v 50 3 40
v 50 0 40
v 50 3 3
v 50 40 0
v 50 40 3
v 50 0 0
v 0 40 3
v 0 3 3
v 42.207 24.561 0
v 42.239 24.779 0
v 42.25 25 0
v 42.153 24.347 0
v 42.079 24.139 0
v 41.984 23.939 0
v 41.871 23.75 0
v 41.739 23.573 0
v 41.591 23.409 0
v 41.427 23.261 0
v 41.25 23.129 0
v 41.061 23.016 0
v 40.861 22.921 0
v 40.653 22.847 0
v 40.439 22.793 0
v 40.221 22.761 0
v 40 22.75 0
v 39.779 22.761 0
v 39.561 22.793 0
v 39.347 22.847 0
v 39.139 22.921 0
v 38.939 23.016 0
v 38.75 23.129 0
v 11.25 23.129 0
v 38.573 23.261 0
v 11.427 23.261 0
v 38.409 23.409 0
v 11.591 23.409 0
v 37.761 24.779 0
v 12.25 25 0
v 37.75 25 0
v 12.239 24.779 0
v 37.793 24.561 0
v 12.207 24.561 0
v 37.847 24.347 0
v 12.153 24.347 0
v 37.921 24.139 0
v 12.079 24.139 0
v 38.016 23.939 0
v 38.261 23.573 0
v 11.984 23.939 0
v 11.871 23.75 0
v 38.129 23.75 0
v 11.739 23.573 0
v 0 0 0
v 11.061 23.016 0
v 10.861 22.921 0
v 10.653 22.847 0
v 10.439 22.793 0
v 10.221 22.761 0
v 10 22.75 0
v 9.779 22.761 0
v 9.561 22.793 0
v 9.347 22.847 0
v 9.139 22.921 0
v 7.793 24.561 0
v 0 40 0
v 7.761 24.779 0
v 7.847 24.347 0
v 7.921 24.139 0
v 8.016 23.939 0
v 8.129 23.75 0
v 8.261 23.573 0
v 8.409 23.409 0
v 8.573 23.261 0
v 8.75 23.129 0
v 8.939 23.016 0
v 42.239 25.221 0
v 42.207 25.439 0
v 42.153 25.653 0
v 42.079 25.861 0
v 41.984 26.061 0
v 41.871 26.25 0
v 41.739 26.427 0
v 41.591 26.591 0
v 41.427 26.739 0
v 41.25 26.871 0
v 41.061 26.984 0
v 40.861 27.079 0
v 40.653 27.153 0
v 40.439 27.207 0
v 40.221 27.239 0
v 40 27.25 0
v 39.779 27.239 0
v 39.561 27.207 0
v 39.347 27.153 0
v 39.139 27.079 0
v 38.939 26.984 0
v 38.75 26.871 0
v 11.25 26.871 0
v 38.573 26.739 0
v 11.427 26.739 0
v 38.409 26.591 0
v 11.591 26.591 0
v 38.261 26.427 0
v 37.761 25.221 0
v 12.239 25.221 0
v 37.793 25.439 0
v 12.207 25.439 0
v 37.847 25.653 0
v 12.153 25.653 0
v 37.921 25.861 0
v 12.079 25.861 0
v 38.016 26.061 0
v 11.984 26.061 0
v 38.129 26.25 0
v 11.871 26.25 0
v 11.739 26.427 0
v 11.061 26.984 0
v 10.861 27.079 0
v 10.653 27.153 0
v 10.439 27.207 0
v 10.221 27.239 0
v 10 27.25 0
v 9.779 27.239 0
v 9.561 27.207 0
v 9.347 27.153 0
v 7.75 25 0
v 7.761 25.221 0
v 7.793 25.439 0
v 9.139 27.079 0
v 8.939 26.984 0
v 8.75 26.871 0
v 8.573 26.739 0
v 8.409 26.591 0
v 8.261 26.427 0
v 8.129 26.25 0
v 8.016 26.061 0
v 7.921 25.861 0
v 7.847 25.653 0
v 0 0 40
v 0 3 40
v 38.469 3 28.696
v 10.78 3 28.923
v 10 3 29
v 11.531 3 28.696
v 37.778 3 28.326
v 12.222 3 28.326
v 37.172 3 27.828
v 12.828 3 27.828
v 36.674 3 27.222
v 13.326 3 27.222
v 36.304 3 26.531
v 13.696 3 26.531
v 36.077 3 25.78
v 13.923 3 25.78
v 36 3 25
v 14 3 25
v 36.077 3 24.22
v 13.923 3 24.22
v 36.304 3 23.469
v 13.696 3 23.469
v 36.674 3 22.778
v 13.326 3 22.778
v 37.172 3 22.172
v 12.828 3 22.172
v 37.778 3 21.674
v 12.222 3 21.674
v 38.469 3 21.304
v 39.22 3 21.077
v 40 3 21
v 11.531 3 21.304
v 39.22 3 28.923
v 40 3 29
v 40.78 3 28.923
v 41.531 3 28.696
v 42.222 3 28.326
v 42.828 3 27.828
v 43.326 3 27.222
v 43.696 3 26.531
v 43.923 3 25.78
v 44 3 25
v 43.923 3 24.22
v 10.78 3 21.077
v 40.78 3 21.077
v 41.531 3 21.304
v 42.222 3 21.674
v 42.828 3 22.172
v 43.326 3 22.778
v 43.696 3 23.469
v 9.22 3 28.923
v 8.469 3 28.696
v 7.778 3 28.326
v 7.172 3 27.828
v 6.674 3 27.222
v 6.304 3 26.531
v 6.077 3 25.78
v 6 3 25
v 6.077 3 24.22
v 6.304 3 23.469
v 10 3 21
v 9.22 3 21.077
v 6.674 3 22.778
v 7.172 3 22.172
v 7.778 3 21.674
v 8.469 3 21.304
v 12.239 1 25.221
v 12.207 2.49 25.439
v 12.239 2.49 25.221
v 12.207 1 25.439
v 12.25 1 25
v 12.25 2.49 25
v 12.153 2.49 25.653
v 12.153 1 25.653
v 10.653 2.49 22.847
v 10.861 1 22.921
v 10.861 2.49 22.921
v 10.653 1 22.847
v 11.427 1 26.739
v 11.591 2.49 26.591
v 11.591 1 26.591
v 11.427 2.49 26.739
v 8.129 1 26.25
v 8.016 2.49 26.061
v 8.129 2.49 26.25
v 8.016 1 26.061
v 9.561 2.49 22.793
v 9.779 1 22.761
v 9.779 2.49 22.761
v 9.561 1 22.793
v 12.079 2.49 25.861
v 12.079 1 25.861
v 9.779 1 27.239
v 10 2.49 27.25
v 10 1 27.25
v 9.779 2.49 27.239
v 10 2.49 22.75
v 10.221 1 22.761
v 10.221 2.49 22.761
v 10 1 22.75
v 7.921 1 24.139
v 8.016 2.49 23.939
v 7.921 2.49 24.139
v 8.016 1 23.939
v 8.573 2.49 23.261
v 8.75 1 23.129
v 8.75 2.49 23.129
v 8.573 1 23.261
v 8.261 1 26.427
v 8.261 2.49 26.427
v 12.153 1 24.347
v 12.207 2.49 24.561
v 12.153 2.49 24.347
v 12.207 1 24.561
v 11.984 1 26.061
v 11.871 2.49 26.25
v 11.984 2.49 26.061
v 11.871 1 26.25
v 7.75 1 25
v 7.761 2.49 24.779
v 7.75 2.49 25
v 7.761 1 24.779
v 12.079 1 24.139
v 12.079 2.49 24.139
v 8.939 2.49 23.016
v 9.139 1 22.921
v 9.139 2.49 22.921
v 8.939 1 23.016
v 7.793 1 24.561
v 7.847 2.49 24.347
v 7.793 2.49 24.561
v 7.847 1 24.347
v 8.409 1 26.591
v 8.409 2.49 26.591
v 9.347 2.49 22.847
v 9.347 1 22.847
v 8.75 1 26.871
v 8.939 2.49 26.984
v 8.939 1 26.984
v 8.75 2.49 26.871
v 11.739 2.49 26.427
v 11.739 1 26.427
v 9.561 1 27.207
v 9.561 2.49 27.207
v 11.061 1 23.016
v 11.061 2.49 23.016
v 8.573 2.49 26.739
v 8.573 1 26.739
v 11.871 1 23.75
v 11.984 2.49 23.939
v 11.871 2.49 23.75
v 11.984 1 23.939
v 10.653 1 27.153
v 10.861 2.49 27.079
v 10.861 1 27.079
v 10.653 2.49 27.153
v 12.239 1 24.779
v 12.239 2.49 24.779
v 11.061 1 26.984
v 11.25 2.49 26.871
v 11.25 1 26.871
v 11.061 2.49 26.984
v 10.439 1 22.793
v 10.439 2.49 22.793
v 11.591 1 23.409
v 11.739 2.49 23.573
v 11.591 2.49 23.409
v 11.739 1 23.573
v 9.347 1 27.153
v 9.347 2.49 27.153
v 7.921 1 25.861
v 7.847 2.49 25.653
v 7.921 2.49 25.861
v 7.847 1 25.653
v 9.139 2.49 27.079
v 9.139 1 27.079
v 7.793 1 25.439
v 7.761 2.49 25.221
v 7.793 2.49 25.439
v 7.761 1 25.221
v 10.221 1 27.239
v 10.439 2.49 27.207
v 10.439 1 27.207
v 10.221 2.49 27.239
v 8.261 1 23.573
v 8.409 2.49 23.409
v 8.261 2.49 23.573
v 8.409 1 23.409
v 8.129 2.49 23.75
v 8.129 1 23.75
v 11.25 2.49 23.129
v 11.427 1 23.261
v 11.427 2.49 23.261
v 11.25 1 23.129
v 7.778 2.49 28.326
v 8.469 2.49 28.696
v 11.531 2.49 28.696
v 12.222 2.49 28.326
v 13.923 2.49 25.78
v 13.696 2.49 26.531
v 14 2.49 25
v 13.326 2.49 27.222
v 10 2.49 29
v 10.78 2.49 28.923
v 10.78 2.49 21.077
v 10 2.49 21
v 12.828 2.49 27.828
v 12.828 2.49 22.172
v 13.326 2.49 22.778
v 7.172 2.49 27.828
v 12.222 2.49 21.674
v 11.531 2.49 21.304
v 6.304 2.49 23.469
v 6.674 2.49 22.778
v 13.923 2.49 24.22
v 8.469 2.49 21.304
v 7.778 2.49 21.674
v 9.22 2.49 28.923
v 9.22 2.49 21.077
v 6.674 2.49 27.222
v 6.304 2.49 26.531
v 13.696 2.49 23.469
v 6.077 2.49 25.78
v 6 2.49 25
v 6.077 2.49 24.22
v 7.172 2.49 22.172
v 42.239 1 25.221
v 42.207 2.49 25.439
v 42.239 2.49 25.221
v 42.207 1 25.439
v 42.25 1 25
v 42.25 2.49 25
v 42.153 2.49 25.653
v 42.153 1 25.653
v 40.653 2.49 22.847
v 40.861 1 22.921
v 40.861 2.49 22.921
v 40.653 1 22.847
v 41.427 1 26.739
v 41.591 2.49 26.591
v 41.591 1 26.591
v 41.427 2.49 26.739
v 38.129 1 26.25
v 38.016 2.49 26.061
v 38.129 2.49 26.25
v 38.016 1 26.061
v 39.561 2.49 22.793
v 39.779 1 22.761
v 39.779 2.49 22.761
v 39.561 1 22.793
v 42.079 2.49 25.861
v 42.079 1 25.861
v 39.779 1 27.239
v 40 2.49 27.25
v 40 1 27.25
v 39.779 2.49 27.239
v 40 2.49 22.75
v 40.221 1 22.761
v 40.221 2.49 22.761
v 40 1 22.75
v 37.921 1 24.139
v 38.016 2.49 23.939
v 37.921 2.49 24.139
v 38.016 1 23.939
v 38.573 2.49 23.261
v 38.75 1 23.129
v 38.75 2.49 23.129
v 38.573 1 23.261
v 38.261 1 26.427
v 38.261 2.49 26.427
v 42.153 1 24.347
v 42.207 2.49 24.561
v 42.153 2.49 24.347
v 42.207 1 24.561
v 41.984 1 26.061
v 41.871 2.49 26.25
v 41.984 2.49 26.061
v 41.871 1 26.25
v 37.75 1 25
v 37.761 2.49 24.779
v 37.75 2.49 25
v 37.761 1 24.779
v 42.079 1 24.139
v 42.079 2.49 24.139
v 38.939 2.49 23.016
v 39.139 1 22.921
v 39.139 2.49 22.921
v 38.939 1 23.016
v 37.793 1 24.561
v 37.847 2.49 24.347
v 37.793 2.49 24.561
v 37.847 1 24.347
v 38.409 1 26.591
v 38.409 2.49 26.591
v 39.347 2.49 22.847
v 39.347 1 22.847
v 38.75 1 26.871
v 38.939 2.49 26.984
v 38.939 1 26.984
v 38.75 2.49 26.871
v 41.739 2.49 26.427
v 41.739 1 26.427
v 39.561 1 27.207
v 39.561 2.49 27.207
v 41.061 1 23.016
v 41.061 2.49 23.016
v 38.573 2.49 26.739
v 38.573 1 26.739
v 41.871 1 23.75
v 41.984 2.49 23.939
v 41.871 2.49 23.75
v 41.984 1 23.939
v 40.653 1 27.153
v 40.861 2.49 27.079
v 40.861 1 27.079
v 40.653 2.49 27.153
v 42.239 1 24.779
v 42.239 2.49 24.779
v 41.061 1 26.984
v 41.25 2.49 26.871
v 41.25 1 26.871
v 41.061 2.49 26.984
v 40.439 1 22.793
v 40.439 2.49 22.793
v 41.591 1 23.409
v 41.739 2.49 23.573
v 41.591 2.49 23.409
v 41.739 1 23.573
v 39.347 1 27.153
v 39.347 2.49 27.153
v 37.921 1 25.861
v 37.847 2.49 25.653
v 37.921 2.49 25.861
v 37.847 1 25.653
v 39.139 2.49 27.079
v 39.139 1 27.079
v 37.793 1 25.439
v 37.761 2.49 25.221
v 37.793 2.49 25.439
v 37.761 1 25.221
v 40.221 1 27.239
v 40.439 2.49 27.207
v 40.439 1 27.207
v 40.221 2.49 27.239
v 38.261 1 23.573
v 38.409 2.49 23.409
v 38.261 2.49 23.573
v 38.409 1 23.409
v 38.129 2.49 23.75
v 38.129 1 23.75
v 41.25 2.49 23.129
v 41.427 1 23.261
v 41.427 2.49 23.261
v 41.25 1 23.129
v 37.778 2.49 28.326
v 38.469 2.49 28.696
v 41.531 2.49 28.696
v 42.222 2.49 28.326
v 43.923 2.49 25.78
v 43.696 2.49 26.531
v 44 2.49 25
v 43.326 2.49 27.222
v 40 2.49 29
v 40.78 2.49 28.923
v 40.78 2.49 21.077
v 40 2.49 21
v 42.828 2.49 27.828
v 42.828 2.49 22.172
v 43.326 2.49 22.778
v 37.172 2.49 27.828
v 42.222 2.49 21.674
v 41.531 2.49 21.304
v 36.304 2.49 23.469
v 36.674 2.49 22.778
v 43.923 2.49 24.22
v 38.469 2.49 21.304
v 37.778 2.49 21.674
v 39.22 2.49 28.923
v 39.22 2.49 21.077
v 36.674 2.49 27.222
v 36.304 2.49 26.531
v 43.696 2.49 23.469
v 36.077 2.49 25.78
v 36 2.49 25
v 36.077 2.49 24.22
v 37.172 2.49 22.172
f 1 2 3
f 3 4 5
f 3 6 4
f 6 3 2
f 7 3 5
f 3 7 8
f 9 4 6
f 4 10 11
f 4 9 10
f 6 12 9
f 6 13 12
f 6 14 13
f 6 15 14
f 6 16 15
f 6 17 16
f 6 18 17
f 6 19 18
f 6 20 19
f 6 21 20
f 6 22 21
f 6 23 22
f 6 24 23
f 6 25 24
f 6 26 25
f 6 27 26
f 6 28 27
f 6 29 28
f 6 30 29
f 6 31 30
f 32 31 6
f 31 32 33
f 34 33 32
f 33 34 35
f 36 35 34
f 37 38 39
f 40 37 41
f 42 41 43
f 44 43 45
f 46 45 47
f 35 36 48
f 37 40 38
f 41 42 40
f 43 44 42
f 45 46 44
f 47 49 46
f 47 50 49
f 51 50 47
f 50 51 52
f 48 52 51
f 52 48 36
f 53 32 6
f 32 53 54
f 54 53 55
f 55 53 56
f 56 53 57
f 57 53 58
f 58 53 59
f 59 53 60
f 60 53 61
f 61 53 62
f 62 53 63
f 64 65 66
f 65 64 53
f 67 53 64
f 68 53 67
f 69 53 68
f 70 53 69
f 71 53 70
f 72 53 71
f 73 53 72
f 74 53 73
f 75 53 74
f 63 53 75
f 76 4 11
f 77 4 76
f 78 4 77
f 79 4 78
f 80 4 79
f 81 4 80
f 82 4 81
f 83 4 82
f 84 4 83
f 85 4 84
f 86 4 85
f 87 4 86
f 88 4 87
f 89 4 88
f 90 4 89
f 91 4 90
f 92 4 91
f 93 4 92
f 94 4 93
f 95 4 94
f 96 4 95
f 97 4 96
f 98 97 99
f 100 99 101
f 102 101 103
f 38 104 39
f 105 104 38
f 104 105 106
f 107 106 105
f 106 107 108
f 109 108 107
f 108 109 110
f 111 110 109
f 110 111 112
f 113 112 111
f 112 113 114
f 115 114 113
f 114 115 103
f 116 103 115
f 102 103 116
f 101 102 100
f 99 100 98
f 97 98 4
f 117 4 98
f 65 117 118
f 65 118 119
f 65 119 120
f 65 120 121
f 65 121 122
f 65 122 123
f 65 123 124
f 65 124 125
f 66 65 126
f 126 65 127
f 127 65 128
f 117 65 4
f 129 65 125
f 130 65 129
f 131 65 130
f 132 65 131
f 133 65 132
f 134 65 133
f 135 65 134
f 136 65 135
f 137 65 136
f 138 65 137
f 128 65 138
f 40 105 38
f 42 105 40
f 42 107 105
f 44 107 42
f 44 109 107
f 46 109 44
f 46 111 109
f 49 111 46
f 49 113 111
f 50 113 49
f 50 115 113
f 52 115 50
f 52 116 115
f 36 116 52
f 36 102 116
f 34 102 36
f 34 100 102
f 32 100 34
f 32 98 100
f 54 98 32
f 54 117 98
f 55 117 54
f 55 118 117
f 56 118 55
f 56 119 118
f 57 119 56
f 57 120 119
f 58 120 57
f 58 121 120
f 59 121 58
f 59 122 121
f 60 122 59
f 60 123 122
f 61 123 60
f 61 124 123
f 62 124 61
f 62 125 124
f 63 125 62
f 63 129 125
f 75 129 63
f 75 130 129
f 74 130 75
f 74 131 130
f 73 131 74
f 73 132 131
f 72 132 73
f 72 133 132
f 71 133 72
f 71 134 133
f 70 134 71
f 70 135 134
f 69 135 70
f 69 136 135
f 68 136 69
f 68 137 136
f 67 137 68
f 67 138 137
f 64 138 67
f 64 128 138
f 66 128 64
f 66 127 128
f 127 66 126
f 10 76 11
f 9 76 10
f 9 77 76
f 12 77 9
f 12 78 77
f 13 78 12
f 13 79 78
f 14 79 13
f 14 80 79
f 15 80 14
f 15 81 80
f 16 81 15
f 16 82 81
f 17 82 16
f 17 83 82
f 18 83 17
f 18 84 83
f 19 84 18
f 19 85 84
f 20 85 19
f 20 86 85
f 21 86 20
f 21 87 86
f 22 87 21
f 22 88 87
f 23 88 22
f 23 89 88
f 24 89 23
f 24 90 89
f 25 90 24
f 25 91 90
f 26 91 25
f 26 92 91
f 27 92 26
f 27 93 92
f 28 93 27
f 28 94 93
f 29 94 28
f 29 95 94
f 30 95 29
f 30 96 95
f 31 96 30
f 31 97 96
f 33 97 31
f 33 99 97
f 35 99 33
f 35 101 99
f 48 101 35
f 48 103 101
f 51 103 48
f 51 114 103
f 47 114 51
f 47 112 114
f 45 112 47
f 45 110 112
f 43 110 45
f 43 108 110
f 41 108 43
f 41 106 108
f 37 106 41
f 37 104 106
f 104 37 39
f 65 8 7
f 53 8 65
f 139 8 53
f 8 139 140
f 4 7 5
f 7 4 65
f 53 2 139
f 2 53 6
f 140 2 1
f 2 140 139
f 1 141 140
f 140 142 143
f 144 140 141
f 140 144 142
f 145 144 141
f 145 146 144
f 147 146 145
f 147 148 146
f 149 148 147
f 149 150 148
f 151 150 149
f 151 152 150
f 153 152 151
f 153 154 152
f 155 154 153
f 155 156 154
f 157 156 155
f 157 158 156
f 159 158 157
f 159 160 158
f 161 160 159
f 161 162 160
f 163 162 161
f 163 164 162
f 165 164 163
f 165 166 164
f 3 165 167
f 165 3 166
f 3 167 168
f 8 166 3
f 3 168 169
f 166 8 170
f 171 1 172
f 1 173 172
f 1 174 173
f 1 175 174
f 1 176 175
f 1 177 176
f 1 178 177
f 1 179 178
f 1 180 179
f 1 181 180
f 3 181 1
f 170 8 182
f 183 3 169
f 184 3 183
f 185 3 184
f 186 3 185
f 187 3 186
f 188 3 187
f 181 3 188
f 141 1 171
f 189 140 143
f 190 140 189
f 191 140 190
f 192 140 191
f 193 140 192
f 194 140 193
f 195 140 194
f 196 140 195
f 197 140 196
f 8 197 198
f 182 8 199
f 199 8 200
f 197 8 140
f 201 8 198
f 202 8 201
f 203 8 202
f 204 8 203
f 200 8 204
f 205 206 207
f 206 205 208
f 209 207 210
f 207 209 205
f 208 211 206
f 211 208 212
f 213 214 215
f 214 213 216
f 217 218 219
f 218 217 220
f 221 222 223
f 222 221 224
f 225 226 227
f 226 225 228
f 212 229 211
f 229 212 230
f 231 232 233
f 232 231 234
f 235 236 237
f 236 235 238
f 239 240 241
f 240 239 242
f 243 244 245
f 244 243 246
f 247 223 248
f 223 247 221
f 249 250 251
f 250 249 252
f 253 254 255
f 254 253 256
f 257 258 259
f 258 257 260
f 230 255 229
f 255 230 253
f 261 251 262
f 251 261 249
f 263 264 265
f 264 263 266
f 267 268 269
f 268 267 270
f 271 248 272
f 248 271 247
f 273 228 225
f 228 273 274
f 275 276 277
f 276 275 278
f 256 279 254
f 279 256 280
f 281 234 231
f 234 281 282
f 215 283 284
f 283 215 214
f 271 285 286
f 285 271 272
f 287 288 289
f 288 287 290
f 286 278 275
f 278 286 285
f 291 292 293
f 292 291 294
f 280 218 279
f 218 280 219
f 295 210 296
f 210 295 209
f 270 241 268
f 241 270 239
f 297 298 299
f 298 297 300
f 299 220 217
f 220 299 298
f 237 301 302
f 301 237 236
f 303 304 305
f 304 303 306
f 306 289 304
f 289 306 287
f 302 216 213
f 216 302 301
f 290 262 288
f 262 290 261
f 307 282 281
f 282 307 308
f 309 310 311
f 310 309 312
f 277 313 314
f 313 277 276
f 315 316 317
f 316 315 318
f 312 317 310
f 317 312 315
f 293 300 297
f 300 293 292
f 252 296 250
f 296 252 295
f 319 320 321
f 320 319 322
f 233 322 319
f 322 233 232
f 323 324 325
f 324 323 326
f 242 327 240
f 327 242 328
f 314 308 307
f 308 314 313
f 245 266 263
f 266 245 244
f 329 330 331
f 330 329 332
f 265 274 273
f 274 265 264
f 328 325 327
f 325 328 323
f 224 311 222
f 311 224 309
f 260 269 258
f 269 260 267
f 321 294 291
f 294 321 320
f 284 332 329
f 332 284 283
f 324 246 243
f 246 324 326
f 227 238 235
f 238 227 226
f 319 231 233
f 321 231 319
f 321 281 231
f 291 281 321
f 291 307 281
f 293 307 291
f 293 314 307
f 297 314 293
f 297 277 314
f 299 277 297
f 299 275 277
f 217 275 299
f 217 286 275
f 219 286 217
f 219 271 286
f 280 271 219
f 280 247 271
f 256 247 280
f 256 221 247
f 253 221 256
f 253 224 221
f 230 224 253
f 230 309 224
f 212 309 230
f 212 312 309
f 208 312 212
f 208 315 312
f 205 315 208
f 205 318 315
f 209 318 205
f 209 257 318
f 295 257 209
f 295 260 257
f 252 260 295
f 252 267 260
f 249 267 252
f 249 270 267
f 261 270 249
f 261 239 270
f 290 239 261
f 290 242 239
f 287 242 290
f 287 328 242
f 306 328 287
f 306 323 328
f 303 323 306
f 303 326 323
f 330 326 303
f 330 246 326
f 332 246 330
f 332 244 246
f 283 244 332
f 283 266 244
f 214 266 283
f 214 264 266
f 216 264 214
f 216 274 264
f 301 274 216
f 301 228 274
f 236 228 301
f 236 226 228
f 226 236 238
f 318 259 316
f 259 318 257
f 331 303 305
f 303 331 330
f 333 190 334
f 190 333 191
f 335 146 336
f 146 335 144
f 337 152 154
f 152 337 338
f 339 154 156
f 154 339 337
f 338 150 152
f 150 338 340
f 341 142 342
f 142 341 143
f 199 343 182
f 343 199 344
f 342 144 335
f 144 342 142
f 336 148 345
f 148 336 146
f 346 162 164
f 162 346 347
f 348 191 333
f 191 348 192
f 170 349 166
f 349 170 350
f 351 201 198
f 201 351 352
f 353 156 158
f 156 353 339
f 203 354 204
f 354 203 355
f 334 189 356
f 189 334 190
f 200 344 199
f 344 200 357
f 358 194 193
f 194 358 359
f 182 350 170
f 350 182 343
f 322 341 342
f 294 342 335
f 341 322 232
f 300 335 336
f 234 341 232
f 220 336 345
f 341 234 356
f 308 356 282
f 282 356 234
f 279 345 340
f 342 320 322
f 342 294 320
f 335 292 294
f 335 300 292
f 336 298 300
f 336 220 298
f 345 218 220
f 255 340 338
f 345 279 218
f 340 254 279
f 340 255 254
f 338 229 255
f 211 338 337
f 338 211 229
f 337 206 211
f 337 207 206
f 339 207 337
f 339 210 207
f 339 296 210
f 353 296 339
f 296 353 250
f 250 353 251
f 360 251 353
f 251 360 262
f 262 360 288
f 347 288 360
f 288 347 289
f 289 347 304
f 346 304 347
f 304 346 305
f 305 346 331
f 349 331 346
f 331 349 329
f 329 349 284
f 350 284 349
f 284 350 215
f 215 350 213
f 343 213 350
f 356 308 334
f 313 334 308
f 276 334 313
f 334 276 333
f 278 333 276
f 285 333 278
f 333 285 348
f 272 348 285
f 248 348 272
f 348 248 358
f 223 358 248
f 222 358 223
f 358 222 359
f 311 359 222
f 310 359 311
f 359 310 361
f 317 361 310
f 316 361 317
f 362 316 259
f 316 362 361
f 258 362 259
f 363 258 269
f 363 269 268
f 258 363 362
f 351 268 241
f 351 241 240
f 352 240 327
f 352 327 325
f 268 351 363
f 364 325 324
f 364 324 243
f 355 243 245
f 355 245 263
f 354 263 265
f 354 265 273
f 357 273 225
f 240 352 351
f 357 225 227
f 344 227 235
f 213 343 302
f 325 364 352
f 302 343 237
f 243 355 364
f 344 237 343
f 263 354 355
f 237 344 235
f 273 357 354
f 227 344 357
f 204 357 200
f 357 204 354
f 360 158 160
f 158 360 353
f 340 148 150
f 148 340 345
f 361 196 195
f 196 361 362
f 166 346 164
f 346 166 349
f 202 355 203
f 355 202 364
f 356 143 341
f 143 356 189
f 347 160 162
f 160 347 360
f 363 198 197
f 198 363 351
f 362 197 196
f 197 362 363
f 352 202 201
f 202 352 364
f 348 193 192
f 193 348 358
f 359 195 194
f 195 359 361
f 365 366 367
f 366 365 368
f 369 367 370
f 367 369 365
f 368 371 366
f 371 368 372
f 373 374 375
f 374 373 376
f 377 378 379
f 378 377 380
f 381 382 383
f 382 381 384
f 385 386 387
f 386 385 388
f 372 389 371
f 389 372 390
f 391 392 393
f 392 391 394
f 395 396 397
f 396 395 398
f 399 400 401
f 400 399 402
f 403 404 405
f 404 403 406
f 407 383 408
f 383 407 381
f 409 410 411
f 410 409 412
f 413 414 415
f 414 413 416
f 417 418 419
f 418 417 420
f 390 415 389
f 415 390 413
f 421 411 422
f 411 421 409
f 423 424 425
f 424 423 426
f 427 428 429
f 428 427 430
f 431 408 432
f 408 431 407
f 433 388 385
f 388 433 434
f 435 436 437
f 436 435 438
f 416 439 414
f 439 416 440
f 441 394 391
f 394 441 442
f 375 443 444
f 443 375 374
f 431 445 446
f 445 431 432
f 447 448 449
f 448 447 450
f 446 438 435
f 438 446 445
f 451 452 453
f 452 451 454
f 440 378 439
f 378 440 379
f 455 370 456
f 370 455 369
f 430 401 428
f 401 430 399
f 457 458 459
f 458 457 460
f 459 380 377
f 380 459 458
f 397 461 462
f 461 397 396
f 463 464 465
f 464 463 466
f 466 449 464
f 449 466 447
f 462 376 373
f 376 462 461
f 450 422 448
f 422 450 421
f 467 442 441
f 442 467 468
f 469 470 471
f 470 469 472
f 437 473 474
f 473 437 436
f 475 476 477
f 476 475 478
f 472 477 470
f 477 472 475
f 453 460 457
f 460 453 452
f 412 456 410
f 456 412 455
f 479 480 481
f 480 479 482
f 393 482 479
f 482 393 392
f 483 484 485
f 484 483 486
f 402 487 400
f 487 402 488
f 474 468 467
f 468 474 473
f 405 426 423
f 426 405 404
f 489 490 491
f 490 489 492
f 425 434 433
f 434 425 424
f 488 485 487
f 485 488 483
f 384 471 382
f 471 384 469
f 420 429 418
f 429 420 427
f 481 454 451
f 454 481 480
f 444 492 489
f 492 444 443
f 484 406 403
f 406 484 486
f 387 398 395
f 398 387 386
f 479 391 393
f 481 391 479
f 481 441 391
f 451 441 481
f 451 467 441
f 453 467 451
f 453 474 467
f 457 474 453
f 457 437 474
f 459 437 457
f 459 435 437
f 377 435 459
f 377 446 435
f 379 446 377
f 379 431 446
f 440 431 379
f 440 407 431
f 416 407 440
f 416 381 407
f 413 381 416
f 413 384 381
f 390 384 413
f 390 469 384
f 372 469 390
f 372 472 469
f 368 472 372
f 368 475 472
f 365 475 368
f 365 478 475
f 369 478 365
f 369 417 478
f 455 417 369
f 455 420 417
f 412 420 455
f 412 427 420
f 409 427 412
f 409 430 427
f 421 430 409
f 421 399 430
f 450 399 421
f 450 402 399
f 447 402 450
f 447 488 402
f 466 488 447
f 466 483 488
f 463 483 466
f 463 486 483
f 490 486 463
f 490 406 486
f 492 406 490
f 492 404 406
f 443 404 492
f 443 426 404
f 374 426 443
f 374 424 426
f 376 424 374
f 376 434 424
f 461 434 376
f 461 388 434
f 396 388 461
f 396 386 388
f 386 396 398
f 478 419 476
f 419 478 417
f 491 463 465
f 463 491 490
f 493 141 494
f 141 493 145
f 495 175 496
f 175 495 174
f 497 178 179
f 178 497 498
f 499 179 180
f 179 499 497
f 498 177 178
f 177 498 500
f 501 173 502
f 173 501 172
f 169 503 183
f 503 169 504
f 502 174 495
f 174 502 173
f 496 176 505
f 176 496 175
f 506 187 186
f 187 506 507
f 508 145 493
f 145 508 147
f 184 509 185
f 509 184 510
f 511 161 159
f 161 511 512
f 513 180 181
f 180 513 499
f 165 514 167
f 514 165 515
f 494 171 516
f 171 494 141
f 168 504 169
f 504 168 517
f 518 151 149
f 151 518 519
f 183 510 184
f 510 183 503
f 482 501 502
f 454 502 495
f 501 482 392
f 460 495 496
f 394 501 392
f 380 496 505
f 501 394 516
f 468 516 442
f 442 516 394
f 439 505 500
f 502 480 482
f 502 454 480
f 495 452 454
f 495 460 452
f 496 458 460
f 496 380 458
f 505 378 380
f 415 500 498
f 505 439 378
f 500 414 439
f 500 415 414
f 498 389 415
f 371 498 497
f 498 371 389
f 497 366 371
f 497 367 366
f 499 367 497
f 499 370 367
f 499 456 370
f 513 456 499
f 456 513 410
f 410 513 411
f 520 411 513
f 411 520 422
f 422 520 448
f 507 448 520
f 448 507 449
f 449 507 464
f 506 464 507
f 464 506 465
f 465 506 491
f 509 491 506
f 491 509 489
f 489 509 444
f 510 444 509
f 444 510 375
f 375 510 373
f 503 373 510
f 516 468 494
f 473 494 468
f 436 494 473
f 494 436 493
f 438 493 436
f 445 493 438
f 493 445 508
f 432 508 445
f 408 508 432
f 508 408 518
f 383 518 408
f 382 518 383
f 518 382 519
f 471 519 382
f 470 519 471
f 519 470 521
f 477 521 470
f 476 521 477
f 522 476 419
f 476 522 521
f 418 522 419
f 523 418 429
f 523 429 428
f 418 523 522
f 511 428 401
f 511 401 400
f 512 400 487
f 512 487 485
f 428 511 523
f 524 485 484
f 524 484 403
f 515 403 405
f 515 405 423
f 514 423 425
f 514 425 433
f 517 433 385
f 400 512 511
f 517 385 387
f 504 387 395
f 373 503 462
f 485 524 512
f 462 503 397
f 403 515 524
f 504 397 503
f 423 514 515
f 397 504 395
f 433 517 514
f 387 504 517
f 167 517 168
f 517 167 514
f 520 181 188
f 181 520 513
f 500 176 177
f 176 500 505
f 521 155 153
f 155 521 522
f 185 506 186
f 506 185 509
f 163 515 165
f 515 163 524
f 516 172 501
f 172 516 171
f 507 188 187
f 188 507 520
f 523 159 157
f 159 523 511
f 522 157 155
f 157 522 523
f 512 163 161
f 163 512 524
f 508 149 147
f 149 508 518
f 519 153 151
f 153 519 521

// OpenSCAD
// パラメータ設定
width = 50;
depth = 40;
height = 40;
thickness = 3;

hole_dia = 4.5;
cs_dia = 8.0;
cs_depth = 2.0;

module hole() {
    union() {
        cylinder(d = hole_dia, h = thickness * 2, center = true);
        translate([0, 0, thickness / 2 - cs_depth + 0.01])
            cylinder(d = cs_dia, h = cs_depth, $fn = 32);
    }
}

module l_bracket() {
    difference() {
        union() {
            // 水平面
            cube([width, depth, thickness]);
            // 垂直面
            cube([width, thickness, height]);
        }

        // 水平面の穴
        for (x = [-1, 1]) {
            translate([width / 2 + x * 15, 10 + (depth - 10) / 2, -thickness])
                hole();
        }

        // 垂直面の穴
        for (x = [-1, 1]) {
            translate([width / 2 + x * 15, thickness + 1, 10 + (height - 10) / 2])
                rotate([90, 0, 0])
                    hole();
        }
    }
}

$fn = 64;
l_bracket();
